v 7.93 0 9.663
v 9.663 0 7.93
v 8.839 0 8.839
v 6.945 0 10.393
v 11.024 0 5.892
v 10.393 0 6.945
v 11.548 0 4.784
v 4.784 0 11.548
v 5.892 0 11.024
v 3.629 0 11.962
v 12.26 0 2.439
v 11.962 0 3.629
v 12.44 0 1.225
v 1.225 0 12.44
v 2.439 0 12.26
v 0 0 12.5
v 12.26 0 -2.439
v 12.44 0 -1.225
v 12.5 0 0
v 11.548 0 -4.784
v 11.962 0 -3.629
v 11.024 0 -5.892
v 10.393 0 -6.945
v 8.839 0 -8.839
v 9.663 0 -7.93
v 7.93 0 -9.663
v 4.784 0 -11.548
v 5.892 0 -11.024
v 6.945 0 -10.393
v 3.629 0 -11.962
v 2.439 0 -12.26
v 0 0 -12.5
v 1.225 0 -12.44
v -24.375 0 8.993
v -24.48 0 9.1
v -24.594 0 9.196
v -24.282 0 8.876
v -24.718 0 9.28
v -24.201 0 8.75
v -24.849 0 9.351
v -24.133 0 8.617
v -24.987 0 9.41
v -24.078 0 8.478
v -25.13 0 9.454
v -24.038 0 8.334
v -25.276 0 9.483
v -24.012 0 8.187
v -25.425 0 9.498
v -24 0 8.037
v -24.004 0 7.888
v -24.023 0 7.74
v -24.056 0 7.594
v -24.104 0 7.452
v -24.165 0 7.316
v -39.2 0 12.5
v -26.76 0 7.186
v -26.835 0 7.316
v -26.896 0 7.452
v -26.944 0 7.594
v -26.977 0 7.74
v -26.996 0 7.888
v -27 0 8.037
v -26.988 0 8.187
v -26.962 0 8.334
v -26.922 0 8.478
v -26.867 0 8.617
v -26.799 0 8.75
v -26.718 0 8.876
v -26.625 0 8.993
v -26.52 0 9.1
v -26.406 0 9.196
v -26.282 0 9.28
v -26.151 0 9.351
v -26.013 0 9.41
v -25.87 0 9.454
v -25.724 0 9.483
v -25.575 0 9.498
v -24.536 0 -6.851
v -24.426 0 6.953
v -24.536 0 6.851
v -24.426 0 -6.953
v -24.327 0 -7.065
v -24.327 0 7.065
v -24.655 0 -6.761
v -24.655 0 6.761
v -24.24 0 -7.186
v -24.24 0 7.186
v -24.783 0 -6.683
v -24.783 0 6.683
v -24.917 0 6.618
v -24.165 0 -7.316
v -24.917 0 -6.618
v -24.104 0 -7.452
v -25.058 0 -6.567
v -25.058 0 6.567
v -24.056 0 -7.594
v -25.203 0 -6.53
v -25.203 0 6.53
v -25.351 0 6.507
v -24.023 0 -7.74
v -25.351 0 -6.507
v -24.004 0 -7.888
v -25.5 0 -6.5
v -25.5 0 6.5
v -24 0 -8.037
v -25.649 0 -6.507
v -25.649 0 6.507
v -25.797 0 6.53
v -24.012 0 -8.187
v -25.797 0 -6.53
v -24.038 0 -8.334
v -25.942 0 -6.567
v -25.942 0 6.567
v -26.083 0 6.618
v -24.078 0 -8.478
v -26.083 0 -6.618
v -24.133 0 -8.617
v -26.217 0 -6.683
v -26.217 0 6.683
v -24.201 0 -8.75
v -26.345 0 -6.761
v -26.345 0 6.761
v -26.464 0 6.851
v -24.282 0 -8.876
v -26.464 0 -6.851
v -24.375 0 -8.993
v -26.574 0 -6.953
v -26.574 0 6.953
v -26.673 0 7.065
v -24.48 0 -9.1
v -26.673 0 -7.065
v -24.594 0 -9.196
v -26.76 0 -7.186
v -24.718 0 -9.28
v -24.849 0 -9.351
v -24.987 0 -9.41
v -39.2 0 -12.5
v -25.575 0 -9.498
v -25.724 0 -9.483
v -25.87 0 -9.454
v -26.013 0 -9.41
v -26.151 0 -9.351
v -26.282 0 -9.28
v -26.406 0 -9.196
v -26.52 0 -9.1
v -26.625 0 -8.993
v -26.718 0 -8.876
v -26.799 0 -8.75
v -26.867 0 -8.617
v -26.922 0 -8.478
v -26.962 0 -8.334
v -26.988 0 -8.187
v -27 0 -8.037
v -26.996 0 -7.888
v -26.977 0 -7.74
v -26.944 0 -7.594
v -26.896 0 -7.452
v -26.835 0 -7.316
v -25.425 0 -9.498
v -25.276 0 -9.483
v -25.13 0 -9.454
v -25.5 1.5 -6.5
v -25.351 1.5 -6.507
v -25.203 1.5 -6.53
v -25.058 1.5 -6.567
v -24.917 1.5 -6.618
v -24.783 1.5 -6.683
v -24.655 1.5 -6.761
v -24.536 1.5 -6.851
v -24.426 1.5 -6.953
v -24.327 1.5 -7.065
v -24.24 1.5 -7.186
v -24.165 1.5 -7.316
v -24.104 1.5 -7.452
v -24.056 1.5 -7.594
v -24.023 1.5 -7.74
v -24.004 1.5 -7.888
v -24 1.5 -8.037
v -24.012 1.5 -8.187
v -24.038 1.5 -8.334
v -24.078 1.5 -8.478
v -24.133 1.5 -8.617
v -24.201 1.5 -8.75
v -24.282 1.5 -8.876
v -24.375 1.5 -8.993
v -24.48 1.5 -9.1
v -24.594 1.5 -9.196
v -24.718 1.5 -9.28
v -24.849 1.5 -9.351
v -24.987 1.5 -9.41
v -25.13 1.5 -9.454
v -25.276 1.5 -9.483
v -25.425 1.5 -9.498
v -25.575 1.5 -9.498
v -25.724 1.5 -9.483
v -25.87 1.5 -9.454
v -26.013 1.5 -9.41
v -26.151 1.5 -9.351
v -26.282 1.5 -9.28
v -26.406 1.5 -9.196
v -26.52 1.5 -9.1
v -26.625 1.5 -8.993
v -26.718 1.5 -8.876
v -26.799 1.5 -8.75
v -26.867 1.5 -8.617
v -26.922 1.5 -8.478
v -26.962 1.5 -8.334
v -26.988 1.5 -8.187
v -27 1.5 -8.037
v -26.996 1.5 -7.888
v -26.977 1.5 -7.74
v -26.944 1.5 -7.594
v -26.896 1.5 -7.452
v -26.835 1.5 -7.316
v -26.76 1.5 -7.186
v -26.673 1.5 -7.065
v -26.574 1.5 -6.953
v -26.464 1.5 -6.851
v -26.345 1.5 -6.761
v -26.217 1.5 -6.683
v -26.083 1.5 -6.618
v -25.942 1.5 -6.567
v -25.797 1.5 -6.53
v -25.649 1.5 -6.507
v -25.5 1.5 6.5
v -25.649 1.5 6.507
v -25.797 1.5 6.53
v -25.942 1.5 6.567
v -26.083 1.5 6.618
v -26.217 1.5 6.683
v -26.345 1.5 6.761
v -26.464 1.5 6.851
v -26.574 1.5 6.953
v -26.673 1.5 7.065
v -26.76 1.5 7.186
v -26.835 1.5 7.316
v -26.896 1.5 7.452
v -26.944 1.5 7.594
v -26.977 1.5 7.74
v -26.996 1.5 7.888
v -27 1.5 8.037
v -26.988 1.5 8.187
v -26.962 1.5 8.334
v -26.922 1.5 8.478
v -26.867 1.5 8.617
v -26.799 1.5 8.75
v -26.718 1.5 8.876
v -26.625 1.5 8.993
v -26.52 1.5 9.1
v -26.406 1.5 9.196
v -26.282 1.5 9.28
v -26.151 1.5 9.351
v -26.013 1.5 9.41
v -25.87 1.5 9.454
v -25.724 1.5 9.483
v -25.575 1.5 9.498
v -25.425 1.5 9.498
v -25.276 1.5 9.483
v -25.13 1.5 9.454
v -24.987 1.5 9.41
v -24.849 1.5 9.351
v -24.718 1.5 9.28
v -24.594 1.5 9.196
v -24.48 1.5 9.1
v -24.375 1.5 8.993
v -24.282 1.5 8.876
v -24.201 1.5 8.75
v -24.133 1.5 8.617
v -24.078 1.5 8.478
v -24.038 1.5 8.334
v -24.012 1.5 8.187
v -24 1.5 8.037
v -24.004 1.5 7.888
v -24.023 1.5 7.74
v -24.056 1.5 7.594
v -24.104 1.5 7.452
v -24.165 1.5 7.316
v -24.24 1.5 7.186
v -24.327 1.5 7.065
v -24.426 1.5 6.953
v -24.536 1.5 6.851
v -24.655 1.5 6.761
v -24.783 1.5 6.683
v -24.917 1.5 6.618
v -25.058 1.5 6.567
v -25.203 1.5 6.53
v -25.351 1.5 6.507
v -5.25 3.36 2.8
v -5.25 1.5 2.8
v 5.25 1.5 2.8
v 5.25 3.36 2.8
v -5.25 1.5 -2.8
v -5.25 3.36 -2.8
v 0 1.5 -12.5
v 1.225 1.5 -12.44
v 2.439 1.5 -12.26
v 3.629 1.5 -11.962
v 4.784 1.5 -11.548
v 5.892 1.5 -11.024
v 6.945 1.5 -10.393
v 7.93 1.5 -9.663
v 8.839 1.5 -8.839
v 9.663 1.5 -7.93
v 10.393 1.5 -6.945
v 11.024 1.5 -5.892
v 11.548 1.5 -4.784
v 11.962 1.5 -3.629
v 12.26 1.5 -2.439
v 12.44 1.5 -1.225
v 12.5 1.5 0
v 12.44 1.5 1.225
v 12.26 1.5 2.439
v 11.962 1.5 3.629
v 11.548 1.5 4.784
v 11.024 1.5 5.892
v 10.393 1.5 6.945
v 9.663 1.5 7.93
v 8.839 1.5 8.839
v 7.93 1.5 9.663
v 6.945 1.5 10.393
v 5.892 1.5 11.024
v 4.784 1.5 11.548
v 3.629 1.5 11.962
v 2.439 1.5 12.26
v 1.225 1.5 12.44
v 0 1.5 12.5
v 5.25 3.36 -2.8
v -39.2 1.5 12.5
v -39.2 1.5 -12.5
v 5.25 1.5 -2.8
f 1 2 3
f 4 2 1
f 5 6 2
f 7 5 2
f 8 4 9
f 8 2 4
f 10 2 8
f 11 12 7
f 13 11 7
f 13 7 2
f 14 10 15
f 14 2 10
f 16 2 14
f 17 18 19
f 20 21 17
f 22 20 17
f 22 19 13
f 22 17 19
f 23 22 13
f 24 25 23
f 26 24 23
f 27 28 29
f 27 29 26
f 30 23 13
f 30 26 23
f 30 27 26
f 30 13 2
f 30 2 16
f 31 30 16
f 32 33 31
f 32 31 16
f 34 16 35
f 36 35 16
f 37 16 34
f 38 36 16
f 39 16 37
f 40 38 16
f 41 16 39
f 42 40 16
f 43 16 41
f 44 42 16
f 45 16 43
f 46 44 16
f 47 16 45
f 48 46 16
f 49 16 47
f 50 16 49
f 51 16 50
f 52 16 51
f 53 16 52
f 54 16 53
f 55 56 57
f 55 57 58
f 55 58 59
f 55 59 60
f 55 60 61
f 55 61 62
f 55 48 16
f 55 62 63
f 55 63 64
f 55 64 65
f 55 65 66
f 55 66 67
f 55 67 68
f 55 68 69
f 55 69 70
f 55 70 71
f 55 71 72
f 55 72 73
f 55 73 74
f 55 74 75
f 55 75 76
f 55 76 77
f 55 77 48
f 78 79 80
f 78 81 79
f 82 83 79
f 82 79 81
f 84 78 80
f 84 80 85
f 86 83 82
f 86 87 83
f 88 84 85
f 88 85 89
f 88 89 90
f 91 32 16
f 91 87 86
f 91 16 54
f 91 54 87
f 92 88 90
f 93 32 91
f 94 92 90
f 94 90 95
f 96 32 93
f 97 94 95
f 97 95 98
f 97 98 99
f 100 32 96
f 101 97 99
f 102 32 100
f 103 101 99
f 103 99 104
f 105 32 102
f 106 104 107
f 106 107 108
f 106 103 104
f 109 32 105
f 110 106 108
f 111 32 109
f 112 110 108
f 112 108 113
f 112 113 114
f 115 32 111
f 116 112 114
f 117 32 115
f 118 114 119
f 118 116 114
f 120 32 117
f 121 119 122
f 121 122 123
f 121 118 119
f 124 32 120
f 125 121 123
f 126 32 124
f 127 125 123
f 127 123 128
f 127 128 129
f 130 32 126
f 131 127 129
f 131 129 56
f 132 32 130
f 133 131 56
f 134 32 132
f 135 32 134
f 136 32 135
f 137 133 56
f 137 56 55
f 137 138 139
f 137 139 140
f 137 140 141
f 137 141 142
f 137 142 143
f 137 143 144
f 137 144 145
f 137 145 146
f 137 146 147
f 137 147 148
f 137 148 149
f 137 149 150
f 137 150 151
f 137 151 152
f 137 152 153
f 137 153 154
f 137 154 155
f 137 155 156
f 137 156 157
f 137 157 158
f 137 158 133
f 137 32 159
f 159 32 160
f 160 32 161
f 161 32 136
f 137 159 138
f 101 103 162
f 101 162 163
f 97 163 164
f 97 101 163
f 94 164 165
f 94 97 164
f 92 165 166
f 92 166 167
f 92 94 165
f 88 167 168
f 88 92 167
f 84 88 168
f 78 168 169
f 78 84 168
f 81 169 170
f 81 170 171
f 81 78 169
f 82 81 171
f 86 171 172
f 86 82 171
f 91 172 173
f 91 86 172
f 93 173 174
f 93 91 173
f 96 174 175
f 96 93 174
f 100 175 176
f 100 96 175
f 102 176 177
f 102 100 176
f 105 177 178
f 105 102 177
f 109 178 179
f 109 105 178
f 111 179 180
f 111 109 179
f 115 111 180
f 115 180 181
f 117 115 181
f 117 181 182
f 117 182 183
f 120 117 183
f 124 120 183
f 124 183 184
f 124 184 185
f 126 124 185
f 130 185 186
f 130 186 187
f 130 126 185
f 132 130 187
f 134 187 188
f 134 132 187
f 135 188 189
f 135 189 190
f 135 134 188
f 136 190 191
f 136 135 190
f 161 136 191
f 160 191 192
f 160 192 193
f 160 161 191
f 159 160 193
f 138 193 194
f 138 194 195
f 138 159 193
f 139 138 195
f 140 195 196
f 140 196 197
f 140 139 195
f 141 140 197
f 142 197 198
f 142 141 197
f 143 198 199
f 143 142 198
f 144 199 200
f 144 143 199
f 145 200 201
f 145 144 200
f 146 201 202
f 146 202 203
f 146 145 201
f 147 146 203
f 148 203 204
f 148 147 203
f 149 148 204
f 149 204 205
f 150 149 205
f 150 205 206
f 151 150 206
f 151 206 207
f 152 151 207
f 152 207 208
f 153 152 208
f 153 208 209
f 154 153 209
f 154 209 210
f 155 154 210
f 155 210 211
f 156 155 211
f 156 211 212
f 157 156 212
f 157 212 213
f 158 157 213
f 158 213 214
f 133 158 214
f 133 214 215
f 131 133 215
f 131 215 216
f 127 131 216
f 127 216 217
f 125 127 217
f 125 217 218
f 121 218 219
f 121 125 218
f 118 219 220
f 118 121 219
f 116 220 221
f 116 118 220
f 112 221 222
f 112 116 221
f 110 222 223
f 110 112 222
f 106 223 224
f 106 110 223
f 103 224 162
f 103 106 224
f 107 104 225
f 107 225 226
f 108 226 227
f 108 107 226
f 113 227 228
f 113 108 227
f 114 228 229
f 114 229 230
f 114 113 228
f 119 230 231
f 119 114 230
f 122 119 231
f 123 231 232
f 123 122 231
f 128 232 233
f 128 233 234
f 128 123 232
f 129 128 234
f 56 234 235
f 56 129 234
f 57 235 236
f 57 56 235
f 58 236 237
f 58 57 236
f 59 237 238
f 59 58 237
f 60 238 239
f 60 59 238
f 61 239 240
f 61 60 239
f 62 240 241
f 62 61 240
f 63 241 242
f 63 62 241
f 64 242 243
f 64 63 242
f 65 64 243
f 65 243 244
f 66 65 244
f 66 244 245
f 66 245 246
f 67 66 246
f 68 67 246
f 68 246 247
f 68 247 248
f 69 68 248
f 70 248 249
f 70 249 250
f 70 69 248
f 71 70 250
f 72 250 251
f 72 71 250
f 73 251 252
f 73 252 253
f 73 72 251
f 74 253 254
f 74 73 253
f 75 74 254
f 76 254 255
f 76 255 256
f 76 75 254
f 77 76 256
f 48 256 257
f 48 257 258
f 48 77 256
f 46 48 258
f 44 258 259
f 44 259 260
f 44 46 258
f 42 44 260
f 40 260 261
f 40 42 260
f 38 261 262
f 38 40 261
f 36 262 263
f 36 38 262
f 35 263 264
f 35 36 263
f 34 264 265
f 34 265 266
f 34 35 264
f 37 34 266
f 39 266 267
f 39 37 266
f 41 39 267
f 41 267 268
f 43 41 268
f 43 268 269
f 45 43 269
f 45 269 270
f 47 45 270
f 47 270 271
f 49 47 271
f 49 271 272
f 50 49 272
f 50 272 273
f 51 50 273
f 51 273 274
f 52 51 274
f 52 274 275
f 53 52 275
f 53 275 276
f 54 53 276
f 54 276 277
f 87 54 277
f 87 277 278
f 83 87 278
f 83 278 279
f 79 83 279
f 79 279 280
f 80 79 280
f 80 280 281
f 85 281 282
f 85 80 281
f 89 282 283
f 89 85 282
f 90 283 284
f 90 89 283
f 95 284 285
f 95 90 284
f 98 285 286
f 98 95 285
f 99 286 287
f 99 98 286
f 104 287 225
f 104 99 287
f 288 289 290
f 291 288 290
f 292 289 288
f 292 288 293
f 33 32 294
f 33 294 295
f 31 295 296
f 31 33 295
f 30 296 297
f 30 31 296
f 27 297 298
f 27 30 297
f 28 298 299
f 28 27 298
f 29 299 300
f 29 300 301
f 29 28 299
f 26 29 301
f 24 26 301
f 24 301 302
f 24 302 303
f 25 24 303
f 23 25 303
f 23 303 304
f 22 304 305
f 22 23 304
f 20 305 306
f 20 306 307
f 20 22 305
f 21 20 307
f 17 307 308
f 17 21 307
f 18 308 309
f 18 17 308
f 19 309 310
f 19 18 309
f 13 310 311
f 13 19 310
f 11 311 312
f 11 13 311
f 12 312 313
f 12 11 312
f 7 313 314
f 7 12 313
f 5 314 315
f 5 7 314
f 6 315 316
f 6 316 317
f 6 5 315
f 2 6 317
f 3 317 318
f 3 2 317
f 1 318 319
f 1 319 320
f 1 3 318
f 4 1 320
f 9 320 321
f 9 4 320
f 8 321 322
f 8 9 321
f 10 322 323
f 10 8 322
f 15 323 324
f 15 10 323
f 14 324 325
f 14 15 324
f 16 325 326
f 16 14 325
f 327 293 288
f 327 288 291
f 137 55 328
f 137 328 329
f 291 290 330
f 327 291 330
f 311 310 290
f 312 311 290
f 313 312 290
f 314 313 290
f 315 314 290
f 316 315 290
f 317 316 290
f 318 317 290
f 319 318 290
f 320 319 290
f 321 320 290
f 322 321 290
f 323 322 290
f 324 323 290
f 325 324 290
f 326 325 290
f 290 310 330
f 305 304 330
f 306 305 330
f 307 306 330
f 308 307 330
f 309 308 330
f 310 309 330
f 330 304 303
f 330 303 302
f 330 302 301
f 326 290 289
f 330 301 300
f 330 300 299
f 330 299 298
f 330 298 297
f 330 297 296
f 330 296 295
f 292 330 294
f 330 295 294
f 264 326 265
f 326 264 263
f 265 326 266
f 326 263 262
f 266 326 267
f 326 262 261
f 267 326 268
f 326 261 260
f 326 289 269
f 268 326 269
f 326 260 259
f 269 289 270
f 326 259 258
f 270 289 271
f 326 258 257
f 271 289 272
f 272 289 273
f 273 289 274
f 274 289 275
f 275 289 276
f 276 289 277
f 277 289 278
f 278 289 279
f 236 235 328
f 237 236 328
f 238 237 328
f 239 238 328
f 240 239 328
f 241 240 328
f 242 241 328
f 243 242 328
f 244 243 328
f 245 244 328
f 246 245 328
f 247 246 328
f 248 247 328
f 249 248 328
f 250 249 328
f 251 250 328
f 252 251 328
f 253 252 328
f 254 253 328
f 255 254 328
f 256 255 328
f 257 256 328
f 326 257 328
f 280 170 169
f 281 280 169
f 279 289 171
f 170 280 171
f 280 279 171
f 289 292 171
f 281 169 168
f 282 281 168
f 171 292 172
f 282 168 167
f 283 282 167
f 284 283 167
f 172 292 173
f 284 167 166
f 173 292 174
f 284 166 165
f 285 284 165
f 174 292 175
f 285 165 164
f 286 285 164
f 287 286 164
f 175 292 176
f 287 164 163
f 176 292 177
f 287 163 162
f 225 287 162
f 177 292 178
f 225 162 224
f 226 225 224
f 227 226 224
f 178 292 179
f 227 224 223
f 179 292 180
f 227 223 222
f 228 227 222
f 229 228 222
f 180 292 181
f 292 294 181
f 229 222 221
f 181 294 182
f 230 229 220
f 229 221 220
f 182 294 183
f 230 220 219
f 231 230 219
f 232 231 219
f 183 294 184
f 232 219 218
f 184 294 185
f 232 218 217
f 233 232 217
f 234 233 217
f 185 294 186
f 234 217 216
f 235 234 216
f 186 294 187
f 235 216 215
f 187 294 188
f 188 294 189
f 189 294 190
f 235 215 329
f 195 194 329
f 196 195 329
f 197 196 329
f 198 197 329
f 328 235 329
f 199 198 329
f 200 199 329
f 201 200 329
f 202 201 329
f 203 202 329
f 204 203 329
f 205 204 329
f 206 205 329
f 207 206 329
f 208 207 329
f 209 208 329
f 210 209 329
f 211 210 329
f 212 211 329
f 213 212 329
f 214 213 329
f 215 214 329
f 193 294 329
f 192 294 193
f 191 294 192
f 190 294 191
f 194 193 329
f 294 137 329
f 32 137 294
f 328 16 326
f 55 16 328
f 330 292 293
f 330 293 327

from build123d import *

# Parameters (mm, degrees)
SZKIC1_R                    = 1.5
DODANIE_WYCI_GNI_CIE1_DEPTH = 1.5
SZKIC2_W                    = 10.5
SZKIC2_H                    = 5.6
DODANIE_WYCI_GNI_CIE2_DEPTH = 1.86


with BuildPart() as part:
    # Szkic1 → Dodanie-wyciągnięcie1 (new body)
    with BuildSketch(Plane(origin=(0, 0, 0), x_dir=(1, 0, 0), z_dir=(0, 1, 0))):
        with BuildLine():
            Line((-39.2, 12.5), (0, 12.5))
            ThreePointArc((0, 12.5), (12.5, 0), (0, -12.5))
            Line((0, -12.5), (-39.2, -12.5))
            Line((-39.2, -12.5), (-39.2, 12.5))
        make_face()
        with Locations(Location((-25.5, 8, 0), (0, 0, 270))):
            Circle(SZKIC1_R, mode=Mode.SUBTRACT)
        with Locations(Location((-25.5, -8, 0), (0, 0, 90))):
            Circle(SZKIC1_R, mode=Mode.SUBTRACT)
    extrude(amount=DODANIE_WYCI_GNI_CIE1_DEPTH)

    # Szkic2 → Dodanie-wyciągnięcie2 (add)
    with BuildSketch(Plane(origin=(0, 1.5, 0), x_dir=(1, 0, 0), z_dir=(0, 1, 0))):
        Rectangle(SZKIC2_W, SZKIC2_H)
    extrude(amount=DODANIE_WYCI_GNI_CIE2_DEPTH)


solid = part.part
